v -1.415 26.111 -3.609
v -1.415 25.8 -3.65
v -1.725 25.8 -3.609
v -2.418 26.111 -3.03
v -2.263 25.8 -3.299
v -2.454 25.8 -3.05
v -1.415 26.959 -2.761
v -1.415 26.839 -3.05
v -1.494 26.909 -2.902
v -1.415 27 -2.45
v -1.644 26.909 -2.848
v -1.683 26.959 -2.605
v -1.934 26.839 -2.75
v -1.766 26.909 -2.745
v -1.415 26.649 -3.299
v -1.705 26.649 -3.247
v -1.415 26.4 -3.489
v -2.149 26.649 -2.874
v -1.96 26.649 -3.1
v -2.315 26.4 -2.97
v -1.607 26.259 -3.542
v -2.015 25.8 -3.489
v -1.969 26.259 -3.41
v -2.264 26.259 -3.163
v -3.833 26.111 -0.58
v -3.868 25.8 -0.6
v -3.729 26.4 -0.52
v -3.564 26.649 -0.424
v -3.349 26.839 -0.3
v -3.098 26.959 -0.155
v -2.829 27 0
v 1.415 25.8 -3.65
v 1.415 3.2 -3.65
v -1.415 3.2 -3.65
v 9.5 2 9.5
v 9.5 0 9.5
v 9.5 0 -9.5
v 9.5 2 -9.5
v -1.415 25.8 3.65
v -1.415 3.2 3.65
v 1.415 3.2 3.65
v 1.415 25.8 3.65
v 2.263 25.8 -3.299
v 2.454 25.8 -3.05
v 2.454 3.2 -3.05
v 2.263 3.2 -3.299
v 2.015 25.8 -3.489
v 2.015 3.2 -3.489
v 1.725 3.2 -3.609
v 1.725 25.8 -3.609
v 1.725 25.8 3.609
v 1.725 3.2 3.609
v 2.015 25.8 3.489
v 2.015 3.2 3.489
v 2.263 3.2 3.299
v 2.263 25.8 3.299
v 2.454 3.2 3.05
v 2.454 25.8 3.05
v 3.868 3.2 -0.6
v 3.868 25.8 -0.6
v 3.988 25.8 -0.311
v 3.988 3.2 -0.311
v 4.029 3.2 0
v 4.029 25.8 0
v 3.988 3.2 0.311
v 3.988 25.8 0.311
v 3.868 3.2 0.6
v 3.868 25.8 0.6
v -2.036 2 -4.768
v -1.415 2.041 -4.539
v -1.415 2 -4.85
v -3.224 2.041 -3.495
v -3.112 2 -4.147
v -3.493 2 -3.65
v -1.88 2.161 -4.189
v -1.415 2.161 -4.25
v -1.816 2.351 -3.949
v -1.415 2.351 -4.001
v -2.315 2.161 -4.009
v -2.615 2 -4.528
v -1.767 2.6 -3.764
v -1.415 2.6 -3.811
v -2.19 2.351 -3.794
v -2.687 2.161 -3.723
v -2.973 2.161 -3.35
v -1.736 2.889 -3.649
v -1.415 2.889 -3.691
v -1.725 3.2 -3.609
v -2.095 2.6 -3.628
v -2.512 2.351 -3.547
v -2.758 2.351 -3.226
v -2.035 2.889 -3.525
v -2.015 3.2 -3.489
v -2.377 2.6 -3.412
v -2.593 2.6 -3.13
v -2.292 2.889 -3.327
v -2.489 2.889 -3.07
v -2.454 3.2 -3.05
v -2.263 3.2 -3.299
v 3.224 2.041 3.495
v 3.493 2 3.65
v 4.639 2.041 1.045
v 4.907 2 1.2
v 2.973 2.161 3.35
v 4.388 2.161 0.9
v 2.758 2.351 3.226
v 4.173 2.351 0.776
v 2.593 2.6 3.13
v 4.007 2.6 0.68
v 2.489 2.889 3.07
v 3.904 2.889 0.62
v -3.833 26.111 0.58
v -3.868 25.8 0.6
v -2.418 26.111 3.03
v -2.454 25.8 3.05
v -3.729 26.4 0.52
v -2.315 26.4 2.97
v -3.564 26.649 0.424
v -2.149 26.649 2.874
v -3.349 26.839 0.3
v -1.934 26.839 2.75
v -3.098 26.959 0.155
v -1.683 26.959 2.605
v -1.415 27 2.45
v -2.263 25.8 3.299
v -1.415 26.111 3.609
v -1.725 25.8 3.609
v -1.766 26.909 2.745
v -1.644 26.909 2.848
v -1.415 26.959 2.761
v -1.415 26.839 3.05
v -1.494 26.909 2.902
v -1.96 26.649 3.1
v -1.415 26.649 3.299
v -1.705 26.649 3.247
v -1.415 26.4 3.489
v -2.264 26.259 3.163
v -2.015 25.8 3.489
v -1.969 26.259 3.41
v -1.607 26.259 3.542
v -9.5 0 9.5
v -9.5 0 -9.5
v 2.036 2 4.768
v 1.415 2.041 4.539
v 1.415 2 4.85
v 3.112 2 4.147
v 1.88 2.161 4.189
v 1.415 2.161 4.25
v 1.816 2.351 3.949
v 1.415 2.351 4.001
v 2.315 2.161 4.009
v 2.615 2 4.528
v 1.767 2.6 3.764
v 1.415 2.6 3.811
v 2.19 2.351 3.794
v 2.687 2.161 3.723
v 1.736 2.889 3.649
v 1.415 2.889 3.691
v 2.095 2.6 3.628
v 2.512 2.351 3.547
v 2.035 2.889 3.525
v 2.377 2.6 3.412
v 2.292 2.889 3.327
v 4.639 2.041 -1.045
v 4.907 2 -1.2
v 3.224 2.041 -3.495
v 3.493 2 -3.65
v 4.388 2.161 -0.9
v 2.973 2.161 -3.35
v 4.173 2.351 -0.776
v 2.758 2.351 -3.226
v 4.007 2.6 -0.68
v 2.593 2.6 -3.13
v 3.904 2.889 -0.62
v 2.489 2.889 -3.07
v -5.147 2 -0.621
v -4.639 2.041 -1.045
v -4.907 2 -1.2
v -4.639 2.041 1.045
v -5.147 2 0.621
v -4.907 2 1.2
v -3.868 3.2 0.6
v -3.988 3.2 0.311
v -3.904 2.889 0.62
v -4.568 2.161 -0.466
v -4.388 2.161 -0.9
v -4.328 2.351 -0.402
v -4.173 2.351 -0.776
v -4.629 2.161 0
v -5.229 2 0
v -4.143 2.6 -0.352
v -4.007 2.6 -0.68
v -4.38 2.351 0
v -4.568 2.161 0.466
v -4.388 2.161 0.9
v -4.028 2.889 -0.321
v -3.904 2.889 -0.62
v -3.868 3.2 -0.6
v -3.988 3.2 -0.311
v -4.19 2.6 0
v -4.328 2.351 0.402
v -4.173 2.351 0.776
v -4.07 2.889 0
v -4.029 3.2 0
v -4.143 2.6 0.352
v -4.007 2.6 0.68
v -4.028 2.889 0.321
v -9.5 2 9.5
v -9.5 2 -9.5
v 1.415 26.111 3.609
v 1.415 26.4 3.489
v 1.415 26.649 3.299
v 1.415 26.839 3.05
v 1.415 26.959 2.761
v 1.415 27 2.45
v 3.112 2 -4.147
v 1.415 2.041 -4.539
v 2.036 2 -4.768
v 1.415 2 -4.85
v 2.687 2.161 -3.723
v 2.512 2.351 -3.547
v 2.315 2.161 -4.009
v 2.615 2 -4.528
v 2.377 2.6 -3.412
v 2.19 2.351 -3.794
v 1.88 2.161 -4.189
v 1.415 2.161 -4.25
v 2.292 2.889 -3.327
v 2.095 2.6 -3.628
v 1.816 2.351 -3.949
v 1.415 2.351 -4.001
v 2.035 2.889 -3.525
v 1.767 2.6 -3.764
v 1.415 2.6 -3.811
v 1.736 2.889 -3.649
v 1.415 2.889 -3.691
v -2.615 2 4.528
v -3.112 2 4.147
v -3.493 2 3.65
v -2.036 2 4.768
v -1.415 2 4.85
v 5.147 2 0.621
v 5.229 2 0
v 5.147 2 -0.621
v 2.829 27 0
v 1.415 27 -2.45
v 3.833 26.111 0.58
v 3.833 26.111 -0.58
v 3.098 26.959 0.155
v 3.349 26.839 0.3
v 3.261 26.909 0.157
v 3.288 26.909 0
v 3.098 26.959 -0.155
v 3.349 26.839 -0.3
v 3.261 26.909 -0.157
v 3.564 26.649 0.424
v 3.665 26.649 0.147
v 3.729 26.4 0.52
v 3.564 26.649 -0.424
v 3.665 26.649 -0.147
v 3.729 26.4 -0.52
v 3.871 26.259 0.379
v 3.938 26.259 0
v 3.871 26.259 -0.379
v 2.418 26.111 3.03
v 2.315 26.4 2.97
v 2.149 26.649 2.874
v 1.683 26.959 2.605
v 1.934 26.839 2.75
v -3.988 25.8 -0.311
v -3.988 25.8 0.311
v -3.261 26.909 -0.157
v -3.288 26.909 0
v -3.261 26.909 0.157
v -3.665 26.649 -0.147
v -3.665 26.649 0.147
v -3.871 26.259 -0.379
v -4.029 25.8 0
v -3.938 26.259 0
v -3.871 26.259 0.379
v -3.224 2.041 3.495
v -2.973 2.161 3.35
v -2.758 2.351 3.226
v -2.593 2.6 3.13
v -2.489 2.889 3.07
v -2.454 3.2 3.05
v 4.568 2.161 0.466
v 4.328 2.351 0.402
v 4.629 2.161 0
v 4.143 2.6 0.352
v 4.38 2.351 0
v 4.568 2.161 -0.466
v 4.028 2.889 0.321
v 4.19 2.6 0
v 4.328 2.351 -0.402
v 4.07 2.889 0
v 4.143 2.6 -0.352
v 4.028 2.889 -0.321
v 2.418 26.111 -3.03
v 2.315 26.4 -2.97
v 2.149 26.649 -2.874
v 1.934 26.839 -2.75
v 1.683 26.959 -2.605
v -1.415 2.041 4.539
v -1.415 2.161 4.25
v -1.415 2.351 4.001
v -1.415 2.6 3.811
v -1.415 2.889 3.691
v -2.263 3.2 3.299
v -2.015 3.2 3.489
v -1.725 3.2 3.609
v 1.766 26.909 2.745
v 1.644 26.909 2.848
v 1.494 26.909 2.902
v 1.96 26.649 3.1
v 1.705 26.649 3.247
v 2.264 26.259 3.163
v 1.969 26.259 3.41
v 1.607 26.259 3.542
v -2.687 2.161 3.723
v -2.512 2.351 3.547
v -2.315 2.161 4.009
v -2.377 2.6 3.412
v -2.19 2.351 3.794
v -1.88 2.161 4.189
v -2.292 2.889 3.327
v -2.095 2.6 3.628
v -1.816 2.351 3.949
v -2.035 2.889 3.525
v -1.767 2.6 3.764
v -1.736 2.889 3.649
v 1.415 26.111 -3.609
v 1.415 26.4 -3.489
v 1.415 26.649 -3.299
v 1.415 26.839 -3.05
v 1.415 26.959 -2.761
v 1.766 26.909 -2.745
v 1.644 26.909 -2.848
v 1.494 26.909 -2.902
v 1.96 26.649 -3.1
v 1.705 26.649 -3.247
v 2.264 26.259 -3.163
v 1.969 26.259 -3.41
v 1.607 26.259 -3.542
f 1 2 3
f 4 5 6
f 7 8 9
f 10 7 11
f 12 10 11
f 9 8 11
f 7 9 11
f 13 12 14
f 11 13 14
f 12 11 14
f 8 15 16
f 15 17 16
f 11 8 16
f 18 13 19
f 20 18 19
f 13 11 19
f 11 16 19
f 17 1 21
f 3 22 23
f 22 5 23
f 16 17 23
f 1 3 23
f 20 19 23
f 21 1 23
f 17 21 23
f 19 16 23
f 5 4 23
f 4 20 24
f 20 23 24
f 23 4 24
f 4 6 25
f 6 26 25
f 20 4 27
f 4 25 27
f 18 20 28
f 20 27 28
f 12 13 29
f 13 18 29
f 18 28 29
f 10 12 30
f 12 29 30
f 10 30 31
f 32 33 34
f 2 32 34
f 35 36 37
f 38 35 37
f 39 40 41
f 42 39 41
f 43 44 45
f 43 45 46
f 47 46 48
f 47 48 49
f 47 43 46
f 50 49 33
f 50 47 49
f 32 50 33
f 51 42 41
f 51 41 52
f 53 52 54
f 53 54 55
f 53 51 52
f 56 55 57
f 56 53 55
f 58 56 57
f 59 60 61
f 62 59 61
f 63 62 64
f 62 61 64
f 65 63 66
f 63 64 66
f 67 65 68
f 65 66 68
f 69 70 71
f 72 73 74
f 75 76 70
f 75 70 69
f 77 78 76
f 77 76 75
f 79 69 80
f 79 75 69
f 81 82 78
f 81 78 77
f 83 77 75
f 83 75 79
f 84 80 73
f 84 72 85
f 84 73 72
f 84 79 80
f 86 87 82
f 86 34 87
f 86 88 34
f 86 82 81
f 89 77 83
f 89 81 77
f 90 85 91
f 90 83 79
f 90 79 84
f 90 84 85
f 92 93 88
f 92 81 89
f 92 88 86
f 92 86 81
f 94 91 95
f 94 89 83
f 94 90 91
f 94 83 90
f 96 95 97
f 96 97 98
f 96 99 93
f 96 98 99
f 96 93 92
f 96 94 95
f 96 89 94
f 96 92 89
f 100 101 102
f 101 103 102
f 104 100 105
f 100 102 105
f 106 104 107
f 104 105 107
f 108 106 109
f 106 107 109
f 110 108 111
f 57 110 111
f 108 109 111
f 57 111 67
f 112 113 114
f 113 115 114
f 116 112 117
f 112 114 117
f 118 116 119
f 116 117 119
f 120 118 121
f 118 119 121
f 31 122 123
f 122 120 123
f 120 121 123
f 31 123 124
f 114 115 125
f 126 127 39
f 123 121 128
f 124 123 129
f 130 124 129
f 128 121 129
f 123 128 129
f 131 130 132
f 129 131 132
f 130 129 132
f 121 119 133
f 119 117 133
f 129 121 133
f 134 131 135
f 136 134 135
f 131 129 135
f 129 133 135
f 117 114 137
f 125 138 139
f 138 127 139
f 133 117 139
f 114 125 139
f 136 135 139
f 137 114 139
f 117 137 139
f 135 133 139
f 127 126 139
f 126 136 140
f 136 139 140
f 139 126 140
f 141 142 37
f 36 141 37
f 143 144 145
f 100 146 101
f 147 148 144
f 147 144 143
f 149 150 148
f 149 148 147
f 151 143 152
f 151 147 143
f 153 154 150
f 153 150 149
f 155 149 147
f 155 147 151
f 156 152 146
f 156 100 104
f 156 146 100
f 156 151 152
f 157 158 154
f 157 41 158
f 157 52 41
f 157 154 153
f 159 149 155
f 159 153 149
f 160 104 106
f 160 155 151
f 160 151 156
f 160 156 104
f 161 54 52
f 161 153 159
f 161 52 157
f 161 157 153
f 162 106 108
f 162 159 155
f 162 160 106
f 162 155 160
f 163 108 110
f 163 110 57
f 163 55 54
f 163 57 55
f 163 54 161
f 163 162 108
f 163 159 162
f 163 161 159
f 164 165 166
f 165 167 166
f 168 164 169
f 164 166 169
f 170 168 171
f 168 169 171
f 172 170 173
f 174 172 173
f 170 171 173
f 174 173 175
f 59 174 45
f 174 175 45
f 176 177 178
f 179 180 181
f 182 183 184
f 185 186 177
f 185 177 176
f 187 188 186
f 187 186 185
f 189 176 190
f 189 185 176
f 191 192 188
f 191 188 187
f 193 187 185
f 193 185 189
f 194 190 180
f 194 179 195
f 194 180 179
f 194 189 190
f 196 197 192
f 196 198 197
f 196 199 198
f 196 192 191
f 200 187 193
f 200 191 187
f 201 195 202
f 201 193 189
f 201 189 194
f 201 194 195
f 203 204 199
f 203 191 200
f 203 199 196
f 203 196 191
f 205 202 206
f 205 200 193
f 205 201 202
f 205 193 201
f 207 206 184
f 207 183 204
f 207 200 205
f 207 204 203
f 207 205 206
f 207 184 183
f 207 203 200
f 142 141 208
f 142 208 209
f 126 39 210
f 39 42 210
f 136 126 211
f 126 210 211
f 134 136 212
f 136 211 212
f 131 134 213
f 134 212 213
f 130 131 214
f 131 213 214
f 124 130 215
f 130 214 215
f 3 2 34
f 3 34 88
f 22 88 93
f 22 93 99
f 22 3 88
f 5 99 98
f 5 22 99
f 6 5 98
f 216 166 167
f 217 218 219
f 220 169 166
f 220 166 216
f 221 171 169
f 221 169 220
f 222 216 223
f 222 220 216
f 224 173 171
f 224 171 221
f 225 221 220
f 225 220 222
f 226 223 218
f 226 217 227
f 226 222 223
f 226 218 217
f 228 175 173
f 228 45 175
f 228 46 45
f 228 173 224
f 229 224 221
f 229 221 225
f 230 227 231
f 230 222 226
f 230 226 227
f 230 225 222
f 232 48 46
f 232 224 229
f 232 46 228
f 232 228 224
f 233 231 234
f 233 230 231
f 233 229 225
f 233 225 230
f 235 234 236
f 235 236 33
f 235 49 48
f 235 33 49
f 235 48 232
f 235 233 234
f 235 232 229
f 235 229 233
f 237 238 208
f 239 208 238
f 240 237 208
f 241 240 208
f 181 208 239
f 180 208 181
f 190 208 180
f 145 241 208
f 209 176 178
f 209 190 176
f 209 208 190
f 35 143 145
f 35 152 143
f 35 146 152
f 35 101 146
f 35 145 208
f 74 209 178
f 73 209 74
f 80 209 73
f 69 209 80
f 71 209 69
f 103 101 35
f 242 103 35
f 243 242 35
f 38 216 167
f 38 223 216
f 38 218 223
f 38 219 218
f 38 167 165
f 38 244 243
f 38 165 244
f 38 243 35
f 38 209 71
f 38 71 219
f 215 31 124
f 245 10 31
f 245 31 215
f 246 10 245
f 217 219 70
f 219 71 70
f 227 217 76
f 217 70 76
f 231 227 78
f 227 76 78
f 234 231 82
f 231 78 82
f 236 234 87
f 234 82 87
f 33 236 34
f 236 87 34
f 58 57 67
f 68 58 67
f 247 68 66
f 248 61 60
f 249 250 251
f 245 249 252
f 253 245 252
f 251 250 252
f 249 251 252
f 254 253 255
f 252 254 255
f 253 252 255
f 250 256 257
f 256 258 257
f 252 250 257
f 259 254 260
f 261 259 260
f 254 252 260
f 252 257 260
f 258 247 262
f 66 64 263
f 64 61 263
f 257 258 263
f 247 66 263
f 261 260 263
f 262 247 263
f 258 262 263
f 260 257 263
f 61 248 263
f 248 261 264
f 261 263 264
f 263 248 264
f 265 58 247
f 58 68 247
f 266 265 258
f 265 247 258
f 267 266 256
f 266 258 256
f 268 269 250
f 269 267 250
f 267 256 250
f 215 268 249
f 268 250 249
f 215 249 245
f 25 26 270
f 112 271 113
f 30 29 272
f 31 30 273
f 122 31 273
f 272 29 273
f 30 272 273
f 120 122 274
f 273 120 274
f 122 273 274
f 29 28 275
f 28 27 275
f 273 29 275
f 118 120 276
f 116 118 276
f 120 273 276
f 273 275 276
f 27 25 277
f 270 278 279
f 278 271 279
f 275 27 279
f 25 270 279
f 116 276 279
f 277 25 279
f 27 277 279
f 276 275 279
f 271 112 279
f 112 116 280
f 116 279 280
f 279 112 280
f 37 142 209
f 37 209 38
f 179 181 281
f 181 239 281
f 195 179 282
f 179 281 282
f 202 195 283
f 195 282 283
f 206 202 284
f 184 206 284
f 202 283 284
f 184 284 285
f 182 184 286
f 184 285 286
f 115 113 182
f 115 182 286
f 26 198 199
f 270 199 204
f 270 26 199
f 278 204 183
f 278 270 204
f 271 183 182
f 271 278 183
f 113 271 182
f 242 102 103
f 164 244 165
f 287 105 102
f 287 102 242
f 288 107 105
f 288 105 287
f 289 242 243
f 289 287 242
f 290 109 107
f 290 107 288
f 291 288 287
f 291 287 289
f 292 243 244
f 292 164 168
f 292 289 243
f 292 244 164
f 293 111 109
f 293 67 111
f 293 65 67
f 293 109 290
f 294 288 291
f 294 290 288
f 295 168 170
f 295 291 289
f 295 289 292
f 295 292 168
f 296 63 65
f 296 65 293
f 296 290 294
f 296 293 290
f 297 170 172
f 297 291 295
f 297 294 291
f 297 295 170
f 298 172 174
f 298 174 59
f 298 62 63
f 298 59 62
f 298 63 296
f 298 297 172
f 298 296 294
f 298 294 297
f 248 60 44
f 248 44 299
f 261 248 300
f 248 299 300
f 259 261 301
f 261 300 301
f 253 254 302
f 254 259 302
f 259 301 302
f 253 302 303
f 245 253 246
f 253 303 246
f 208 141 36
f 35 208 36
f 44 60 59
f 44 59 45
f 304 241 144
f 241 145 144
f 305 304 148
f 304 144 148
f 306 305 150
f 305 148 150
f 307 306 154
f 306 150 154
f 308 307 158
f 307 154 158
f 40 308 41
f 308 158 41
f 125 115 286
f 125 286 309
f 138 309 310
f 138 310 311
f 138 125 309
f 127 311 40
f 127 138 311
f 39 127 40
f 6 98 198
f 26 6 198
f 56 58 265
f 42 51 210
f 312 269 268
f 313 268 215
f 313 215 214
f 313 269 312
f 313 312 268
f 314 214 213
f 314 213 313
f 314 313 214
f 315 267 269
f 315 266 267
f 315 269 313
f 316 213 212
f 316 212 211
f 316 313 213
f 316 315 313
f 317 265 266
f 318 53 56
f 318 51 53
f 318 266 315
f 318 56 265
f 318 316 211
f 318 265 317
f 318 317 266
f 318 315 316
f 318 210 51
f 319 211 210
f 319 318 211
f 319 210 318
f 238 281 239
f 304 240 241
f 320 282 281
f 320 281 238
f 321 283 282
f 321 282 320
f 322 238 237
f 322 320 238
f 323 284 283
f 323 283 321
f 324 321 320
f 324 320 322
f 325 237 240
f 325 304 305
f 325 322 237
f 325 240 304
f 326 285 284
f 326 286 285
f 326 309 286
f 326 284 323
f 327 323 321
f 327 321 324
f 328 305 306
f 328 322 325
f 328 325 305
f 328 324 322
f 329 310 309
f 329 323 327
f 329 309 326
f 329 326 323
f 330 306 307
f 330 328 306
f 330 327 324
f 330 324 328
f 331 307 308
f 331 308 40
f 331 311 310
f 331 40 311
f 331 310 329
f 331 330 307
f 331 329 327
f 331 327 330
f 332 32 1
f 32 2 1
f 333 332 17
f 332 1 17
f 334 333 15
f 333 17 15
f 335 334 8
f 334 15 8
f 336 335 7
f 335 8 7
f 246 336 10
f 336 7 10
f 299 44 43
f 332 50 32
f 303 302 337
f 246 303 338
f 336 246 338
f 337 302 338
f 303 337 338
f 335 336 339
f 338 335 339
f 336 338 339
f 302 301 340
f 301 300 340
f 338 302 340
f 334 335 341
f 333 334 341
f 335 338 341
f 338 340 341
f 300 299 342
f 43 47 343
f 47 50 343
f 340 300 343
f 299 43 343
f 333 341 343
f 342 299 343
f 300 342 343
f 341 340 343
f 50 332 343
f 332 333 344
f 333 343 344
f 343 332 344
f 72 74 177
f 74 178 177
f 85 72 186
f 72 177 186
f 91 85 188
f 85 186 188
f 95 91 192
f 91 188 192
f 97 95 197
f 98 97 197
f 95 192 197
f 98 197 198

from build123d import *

# Parameters (mm, degrees)
CROQUIS1_W              = 19
CROQUIS1_H              = 19
SALIENTE_EXTRUIR1_DEPTH = 2
SALIENTE_EXTRUIR2_DEPTH = 25
REDONDEO1_R             = 1.2


with BuildPart() as part:
    # Croquis1 → Saliente-Extruir1 (new body)
    with BuildSketch(Plane(origin=(0, 0, 0), x_dir=(1, 0, 0), z_dir=(0, 1, 0))):
        Rectangle(CROQUIS1_W, CROQUIS1_H)
    extrude(amount=SALIENTE_EXTRUIR1_DEPTH)

    # Croquis2 → Saliente-Extruir2 (add)
    with BuildSketch(Plane(origin=(0, 2, 0), x_dir=(1, 0, 0), z_dir=(0, 1, 0))):
        Polygon((4.214656965, 0), (2.107328483, 3.65), (-2.107328483, 3.65), (-4.214656965, 0), (-2.107328483, -3.65), (2.107328483, -3.65), align=None)
    extrude(amount=SALIENTE_EXTRUIR2_DEPTH)

    # Redondeo1
    redondeo1_edges = [part.edges().sort_by_distance(p)[0] for p in [
        (3.160992724, 2, 1.825),
        (2.107328483, 14.5, 3.65),
        (3.160992724, 2, -1.825),
        (4.214656965, 14.5, 0),
        (0, 2, -3.65),
        (2.107328483, 14.5, -3.65),
        (-3.160992724, 2, -1.825),
        (-2.107328483, 14.5, -3.65),
        (-3.160992724, 2, 1.825),
        (-4.214656965, 14.5, 0),
        (0, 2, 3.65),
        (-2.107328483, 14.5, 3.65),
        (3.160992724, 27, 1.825),
        (3.160992724, 27, -1.825),
        (0, 27, -3.65),
        (-3.160992724, 27, -1.825),
        (-3.160992724, 27, 1.825),
        (0, 27, 3.65),
    ]]
    fillet(redondeo1_edges, radius=REDONDEO1_R)


solid = part.part
